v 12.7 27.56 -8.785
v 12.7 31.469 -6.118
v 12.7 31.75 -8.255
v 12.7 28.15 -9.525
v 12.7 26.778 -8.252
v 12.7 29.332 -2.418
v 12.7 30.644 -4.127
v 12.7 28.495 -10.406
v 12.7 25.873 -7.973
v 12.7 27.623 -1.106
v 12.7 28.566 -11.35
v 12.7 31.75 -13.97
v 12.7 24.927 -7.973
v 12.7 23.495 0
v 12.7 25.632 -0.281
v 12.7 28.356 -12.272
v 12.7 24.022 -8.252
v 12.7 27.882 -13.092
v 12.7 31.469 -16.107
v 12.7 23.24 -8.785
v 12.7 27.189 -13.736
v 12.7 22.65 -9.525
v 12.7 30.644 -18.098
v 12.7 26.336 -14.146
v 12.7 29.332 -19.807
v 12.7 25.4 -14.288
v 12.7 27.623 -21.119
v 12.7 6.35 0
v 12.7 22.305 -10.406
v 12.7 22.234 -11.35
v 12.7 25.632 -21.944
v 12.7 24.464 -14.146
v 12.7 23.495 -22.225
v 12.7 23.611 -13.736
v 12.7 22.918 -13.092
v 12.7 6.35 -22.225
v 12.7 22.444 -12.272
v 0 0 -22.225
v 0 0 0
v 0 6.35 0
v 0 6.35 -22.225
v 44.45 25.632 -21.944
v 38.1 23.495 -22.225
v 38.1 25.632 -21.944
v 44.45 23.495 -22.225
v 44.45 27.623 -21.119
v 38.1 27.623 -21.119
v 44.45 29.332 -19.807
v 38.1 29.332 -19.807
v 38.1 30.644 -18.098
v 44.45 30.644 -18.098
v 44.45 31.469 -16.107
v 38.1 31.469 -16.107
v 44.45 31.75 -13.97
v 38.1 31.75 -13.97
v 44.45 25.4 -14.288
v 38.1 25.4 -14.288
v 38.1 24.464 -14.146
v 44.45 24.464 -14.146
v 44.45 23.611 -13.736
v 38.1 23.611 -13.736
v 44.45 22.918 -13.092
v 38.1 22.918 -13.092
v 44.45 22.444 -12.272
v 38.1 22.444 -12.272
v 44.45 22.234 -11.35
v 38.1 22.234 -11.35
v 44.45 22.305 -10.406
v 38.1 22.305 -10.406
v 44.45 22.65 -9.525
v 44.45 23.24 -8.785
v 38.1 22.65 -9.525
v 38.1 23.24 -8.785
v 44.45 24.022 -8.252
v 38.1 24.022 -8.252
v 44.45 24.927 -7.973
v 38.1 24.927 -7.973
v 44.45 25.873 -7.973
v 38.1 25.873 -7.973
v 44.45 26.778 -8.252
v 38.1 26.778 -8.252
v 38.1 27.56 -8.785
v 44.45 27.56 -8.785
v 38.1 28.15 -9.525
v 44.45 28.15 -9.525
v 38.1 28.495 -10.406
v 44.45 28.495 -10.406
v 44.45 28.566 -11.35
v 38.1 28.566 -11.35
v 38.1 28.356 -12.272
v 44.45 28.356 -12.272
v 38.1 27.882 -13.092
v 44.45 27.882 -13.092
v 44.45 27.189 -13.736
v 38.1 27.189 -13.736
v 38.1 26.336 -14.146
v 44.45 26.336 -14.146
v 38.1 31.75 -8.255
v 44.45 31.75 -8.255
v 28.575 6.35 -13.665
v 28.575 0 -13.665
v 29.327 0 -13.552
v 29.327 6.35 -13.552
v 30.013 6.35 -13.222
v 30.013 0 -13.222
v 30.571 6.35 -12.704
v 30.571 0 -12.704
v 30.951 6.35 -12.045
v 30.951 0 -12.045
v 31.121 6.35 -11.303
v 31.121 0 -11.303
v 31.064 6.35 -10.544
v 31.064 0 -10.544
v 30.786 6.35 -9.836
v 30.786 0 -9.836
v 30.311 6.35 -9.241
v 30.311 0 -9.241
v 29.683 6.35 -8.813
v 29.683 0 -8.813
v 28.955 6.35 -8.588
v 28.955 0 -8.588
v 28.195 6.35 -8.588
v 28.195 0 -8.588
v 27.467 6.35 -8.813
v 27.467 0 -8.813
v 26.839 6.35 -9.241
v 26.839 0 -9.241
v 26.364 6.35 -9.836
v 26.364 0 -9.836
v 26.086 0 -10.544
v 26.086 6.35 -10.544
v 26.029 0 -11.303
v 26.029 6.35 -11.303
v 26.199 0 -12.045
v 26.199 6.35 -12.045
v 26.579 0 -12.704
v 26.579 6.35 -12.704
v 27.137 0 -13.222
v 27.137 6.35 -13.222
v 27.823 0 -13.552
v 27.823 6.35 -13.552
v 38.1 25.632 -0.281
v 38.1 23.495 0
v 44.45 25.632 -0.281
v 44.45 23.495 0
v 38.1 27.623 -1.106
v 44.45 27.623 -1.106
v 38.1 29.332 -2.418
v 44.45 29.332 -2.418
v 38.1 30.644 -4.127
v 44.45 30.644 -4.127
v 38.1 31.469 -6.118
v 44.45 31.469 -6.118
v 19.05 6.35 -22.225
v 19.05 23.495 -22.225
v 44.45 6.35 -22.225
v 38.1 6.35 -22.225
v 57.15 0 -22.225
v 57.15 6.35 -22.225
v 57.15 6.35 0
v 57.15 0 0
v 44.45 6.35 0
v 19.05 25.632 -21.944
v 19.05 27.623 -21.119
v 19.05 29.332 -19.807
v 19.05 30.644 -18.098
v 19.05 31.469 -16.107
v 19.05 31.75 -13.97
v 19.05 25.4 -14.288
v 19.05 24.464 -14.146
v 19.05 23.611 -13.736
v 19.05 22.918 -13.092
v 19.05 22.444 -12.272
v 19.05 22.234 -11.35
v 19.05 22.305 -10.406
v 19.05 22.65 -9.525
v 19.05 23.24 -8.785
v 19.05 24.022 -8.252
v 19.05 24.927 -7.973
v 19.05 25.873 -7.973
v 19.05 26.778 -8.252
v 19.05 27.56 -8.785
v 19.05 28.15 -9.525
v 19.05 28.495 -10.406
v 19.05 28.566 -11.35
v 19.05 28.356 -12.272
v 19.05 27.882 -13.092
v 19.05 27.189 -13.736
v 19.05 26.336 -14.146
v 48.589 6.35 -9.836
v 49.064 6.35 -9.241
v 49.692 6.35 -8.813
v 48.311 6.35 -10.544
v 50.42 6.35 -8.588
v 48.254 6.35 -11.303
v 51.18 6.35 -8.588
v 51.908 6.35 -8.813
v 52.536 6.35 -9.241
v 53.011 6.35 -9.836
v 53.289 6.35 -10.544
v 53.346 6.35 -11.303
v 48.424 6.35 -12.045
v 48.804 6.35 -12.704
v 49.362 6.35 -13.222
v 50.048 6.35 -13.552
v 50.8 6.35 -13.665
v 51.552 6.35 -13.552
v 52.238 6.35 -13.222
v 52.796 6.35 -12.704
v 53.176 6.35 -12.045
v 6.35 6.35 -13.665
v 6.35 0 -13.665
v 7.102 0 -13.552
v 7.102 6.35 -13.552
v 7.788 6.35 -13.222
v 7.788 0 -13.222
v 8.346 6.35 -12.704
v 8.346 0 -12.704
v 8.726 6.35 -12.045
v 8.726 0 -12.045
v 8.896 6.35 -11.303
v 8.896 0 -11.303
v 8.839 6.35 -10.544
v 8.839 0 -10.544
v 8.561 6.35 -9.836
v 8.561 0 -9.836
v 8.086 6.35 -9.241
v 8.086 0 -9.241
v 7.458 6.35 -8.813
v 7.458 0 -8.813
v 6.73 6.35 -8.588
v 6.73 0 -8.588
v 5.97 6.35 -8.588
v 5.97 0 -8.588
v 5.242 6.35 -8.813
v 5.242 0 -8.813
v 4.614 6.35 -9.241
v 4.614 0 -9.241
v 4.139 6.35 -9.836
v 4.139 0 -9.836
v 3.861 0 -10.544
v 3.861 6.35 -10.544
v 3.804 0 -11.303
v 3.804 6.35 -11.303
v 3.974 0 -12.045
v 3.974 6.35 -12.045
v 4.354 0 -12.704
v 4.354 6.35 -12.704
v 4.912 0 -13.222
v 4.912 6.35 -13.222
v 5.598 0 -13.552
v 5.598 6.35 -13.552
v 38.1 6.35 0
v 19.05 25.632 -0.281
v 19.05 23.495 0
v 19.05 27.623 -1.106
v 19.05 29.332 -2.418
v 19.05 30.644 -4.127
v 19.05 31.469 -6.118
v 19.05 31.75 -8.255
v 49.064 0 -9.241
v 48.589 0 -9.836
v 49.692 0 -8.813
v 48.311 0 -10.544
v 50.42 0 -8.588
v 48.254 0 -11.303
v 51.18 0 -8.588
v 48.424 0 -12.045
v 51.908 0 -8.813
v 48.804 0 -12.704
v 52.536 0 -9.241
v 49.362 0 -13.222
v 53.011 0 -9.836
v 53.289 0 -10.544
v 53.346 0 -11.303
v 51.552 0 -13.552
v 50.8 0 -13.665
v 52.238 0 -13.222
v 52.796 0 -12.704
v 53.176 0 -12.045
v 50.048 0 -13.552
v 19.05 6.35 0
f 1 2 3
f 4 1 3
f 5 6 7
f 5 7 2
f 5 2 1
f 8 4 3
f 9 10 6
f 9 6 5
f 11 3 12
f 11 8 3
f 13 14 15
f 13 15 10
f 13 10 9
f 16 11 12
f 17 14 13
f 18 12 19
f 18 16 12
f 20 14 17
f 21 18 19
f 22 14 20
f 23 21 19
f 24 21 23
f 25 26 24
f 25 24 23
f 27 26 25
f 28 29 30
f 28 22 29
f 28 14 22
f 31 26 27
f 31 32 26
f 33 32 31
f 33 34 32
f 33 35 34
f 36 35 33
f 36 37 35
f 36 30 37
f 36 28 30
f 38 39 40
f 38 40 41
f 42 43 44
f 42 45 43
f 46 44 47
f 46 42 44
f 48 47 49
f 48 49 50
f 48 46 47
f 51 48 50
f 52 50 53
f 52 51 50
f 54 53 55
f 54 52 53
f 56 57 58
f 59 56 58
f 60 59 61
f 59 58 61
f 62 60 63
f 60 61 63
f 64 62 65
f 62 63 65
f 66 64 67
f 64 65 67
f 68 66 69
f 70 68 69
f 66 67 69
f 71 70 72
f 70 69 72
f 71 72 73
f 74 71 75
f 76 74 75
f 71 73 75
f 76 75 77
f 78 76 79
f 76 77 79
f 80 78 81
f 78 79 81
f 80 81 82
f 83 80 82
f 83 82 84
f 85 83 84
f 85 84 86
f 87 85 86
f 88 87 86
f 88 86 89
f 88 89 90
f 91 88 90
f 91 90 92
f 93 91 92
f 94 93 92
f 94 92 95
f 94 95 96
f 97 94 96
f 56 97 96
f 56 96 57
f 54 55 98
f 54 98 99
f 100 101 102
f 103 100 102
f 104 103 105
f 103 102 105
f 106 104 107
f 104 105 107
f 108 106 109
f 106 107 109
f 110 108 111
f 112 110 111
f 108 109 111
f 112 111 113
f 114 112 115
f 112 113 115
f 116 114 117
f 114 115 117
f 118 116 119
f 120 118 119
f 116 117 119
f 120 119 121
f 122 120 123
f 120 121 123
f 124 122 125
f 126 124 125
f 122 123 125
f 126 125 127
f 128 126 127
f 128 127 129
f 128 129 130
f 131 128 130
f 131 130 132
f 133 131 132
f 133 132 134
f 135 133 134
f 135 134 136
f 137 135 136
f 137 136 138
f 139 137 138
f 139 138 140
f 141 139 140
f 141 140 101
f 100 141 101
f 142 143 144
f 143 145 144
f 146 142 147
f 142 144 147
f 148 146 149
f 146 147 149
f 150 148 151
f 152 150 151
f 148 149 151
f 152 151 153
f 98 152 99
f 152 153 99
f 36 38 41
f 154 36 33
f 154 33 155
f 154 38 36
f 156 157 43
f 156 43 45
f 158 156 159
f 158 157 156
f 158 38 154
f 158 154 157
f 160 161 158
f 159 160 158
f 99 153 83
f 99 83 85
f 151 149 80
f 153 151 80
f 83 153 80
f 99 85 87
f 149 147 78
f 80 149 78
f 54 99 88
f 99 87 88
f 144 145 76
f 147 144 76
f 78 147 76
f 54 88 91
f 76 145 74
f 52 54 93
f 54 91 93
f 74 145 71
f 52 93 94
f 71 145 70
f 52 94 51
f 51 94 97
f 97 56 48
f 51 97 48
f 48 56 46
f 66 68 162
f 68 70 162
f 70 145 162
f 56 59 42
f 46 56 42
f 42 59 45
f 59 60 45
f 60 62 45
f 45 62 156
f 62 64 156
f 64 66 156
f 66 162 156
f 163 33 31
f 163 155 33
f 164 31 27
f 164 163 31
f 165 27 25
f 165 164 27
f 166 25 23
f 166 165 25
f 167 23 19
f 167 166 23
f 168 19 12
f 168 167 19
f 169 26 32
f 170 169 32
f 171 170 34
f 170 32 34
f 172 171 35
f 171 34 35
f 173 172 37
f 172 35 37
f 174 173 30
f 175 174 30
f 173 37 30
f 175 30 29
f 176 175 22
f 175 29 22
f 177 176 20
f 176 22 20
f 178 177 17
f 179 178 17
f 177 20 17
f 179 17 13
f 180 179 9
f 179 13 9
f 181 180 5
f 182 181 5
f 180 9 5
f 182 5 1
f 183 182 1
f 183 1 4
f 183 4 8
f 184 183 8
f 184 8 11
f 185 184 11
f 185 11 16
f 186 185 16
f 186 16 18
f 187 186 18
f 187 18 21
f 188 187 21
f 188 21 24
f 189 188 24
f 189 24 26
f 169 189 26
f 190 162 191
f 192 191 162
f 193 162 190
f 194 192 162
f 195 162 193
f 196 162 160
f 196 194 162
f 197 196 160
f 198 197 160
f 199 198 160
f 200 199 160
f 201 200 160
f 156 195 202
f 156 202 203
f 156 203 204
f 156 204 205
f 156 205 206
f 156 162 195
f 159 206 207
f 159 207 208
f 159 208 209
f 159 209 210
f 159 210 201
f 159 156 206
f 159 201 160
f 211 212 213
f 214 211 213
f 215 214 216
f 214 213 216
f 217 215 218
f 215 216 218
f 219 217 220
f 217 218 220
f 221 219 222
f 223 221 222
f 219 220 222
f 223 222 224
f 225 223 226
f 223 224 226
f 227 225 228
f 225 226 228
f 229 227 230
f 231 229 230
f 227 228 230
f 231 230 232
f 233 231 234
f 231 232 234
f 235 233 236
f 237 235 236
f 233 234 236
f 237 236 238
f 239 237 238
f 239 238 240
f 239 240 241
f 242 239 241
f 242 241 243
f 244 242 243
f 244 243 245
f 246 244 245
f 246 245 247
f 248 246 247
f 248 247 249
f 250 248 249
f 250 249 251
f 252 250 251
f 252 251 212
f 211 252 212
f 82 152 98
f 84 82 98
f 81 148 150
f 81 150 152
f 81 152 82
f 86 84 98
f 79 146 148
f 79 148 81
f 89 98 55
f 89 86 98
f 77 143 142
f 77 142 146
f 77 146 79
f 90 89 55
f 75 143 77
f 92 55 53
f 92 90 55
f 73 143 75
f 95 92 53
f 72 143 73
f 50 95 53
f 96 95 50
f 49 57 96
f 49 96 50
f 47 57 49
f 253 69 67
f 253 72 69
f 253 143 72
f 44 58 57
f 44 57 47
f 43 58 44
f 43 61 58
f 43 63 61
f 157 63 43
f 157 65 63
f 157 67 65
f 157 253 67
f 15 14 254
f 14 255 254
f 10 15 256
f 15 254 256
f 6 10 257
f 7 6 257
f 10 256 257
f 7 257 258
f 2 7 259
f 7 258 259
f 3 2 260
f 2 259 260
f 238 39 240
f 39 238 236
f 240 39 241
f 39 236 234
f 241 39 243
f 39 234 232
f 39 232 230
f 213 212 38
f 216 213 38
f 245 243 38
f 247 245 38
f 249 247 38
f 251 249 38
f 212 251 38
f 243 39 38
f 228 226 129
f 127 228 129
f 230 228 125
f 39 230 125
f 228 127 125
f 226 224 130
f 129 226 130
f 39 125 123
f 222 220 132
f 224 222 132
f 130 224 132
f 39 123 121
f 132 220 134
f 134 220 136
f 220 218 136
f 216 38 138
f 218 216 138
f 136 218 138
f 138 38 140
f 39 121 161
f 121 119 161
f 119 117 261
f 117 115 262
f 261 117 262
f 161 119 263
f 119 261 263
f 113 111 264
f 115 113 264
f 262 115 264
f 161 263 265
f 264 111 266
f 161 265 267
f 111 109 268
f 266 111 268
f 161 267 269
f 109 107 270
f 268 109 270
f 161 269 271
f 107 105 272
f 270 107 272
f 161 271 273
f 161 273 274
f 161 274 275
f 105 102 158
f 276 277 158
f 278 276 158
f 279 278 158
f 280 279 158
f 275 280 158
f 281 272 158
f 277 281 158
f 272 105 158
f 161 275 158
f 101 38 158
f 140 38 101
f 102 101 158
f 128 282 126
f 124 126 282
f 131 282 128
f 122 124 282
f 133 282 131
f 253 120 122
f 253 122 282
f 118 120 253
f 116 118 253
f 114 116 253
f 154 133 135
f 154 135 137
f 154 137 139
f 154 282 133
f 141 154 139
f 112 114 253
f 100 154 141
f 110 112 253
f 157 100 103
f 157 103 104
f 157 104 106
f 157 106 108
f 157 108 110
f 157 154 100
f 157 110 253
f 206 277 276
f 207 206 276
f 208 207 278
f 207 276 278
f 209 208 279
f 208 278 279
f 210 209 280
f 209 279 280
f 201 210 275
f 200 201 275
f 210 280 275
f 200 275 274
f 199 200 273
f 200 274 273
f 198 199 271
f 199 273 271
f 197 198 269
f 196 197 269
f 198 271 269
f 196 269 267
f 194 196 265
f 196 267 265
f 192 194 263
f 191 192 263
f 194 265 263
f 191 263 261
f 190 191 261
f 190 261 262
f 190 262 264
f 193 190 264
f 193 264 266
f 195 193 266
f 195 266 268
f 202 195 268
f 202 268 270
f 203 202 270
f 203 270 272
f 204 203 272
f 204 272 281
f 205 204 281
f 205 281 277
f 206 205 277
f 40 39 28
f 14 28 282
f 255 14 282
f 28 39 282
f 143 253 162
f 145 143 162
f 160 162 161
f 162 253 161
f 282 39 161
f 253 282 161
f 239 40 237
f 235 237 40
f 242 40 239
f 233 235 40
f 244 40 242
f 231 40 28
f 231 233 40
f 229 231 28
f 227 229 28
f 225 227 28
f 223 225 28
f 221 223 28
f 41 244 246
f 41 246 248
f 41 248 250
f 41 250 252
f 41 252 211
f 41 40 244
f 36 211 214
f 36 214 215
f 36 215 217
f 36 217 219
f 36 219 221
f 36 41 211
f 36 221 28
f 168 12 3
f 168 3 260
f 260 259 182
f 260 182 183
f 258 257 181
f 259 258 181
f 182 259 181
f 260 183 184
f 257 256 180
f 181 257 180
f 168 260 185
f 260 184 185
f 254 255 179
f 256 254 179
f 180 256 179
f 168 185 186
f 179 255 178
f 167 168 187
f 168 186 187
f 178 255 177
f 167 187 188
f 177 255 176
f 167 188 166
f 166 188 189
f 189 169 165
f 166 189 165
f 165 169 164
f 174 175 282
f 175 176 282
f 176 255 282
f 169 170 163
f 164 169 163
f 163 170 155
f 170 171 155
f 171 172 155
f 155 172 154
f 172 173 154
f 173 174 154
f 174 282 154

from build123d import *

# Parameters (mm, degrees)
SKETCH2_W                   = 12.7
SKETCH2_H                   = 22.225
BOSS_EXTRUDE1_DEPTH         = 6.35
SKETCH2_W_2                 = 19.05
BOSS_EXTRUDE1_2_DEPTH       = 6.35
BOSS_EXTRUDE1_3_DEPTH       = 6.35
SKETCH2_3_W                 = 6.35
SKETCH2_3_H                 = 22.225
BOSS_EXTRUDE2_DEPTH         = 31.75
SKETCH3_R                   = 3.175
CUT_EXTRUDE1_DEPTH          = 59.973007597
F_1_4_20_TAPPED_HOLE1_D     = 5.1054
F_1_4_20_TAPPED_HOLE1_DEPTH = 19.05
F_1_4_20_TAPPED_HOLE1_TIP   = 1.533816902
FILLET1_R                   = 8.255


with BuildPart() as part:
    # Sketch2 → Boss-Extrude1 (new body)
    with BuildSketch(Plane(origin=(0, 0, 0), x_dir=(1, 0, 0), z_dir=(0, 1, 0))):
        with Locations((6.35, 11.1125)):
            Rectangle(SKETCH2_W, SKETCH2_H)
    extrude(amount=BOSS_EXTRUDE1_DEPTH)



with BuildPart() as body_2:
    # Sketch2 → Boss-Extrude1 2 (new body)
    with BuildSketch(Plane(origin=(0, 0, 0), x_dir=(1, 0, 0), z_dir=(0, 1, 0))):
        with Locations((28.575, 11.1125)):
            Rectangle(SKETCH2_W_2, SKETCH2_H)
    extrude(amount=BOSS_EXTRUDE1_2_DEPTH)


with BuildPart() as body_3:
    # Sketch2 → Boss-Extrude1 3 (new body)
    with BuildSketch(Plane(origin=(0, 0, 0), x_dir=(1, 0, 0), z_dir=(0, 1, 0))):
        with Locations((50.8, 11.1125)):
            Rectangle(SKETCH2_W, SKETCH2_H)
    extrude(amount=BOSS_EXTRUDE1_3_DEPTH)


with BuildPart() as part_1:
    add(part.part)

    add(body_2.part)  # Boss-Extrude2 merges body 2

    add(body_3.part)  # Boss-Extrude2 merges body 3
    # Sketch2<3> → Boss-Extrude2 (add)
    with BuildSketch(Plane(origin=(0, 0, 0), x_dir=(1, 0, 0), z_dir=(0, 1, 0))):
        with Locations((15.875, 11.1125)):
            Rectangle(SKETCH2_3_W, SKETCH2_3_H)
        with Locations((41.275, 11.1125)):
            Rectangle(SKETCH2_3_W, SKETCH2_3_H)
    extrude(amount=BOSS_EXTRUDE2_DEPTH)

    # Sketch3 → Cut-Extrude1 (cut, through all)
    with BuildSketch(Plane.ZY.offset(-12.7)):
        with Locations((-11.1125, 25.4)):
            Circle(SKETCH3_R)
    extrude(amount=-CUT_EXTRUDE1_DEPTH, mode=Mode.SUBTRACT)

    # 1/4-20 Tapped Hole1
    with Locations(Plane(origin=(6.35, 6.35, -11.1125), x_dir=(0, 0, 1), z_dir=(0, 1, 0))):
        with Locations((0, 0), (0, 22.225), (0, 44.45)):
            Hole(F_1_4_20_TAPPED_HOLE1_D / 2, depth=F_1_4_20_TAPPED_HOLE1_DEPTH)
            with Locations((0, 0, -(F_1_4_20_TAPPED_HOLE1_DEPTH + F_1_4_20_TAPPED_HOLE1_TIP / 2))):  # 118° drill point
                Cone(0, F_1_4_20_TAPPED_HOLE1_D / 2, F_1_4_20_TAPPED_HOLE1_TIP, mode=Mode.SUBTRACT)

    # Fillet1
    fillet1_edges = [part_1.edges().sort_by_distance(p)[0] for p in [
        (15.875, 31.75, -22.225),
        (41.275, 31.75, -22.225),
        (41.275, 31.75, 0),
        (15.875, 31.75, 0),
    ]]
    fillet(fillet1_edges, radius=FILLET1_R)


solid = part_1.part
